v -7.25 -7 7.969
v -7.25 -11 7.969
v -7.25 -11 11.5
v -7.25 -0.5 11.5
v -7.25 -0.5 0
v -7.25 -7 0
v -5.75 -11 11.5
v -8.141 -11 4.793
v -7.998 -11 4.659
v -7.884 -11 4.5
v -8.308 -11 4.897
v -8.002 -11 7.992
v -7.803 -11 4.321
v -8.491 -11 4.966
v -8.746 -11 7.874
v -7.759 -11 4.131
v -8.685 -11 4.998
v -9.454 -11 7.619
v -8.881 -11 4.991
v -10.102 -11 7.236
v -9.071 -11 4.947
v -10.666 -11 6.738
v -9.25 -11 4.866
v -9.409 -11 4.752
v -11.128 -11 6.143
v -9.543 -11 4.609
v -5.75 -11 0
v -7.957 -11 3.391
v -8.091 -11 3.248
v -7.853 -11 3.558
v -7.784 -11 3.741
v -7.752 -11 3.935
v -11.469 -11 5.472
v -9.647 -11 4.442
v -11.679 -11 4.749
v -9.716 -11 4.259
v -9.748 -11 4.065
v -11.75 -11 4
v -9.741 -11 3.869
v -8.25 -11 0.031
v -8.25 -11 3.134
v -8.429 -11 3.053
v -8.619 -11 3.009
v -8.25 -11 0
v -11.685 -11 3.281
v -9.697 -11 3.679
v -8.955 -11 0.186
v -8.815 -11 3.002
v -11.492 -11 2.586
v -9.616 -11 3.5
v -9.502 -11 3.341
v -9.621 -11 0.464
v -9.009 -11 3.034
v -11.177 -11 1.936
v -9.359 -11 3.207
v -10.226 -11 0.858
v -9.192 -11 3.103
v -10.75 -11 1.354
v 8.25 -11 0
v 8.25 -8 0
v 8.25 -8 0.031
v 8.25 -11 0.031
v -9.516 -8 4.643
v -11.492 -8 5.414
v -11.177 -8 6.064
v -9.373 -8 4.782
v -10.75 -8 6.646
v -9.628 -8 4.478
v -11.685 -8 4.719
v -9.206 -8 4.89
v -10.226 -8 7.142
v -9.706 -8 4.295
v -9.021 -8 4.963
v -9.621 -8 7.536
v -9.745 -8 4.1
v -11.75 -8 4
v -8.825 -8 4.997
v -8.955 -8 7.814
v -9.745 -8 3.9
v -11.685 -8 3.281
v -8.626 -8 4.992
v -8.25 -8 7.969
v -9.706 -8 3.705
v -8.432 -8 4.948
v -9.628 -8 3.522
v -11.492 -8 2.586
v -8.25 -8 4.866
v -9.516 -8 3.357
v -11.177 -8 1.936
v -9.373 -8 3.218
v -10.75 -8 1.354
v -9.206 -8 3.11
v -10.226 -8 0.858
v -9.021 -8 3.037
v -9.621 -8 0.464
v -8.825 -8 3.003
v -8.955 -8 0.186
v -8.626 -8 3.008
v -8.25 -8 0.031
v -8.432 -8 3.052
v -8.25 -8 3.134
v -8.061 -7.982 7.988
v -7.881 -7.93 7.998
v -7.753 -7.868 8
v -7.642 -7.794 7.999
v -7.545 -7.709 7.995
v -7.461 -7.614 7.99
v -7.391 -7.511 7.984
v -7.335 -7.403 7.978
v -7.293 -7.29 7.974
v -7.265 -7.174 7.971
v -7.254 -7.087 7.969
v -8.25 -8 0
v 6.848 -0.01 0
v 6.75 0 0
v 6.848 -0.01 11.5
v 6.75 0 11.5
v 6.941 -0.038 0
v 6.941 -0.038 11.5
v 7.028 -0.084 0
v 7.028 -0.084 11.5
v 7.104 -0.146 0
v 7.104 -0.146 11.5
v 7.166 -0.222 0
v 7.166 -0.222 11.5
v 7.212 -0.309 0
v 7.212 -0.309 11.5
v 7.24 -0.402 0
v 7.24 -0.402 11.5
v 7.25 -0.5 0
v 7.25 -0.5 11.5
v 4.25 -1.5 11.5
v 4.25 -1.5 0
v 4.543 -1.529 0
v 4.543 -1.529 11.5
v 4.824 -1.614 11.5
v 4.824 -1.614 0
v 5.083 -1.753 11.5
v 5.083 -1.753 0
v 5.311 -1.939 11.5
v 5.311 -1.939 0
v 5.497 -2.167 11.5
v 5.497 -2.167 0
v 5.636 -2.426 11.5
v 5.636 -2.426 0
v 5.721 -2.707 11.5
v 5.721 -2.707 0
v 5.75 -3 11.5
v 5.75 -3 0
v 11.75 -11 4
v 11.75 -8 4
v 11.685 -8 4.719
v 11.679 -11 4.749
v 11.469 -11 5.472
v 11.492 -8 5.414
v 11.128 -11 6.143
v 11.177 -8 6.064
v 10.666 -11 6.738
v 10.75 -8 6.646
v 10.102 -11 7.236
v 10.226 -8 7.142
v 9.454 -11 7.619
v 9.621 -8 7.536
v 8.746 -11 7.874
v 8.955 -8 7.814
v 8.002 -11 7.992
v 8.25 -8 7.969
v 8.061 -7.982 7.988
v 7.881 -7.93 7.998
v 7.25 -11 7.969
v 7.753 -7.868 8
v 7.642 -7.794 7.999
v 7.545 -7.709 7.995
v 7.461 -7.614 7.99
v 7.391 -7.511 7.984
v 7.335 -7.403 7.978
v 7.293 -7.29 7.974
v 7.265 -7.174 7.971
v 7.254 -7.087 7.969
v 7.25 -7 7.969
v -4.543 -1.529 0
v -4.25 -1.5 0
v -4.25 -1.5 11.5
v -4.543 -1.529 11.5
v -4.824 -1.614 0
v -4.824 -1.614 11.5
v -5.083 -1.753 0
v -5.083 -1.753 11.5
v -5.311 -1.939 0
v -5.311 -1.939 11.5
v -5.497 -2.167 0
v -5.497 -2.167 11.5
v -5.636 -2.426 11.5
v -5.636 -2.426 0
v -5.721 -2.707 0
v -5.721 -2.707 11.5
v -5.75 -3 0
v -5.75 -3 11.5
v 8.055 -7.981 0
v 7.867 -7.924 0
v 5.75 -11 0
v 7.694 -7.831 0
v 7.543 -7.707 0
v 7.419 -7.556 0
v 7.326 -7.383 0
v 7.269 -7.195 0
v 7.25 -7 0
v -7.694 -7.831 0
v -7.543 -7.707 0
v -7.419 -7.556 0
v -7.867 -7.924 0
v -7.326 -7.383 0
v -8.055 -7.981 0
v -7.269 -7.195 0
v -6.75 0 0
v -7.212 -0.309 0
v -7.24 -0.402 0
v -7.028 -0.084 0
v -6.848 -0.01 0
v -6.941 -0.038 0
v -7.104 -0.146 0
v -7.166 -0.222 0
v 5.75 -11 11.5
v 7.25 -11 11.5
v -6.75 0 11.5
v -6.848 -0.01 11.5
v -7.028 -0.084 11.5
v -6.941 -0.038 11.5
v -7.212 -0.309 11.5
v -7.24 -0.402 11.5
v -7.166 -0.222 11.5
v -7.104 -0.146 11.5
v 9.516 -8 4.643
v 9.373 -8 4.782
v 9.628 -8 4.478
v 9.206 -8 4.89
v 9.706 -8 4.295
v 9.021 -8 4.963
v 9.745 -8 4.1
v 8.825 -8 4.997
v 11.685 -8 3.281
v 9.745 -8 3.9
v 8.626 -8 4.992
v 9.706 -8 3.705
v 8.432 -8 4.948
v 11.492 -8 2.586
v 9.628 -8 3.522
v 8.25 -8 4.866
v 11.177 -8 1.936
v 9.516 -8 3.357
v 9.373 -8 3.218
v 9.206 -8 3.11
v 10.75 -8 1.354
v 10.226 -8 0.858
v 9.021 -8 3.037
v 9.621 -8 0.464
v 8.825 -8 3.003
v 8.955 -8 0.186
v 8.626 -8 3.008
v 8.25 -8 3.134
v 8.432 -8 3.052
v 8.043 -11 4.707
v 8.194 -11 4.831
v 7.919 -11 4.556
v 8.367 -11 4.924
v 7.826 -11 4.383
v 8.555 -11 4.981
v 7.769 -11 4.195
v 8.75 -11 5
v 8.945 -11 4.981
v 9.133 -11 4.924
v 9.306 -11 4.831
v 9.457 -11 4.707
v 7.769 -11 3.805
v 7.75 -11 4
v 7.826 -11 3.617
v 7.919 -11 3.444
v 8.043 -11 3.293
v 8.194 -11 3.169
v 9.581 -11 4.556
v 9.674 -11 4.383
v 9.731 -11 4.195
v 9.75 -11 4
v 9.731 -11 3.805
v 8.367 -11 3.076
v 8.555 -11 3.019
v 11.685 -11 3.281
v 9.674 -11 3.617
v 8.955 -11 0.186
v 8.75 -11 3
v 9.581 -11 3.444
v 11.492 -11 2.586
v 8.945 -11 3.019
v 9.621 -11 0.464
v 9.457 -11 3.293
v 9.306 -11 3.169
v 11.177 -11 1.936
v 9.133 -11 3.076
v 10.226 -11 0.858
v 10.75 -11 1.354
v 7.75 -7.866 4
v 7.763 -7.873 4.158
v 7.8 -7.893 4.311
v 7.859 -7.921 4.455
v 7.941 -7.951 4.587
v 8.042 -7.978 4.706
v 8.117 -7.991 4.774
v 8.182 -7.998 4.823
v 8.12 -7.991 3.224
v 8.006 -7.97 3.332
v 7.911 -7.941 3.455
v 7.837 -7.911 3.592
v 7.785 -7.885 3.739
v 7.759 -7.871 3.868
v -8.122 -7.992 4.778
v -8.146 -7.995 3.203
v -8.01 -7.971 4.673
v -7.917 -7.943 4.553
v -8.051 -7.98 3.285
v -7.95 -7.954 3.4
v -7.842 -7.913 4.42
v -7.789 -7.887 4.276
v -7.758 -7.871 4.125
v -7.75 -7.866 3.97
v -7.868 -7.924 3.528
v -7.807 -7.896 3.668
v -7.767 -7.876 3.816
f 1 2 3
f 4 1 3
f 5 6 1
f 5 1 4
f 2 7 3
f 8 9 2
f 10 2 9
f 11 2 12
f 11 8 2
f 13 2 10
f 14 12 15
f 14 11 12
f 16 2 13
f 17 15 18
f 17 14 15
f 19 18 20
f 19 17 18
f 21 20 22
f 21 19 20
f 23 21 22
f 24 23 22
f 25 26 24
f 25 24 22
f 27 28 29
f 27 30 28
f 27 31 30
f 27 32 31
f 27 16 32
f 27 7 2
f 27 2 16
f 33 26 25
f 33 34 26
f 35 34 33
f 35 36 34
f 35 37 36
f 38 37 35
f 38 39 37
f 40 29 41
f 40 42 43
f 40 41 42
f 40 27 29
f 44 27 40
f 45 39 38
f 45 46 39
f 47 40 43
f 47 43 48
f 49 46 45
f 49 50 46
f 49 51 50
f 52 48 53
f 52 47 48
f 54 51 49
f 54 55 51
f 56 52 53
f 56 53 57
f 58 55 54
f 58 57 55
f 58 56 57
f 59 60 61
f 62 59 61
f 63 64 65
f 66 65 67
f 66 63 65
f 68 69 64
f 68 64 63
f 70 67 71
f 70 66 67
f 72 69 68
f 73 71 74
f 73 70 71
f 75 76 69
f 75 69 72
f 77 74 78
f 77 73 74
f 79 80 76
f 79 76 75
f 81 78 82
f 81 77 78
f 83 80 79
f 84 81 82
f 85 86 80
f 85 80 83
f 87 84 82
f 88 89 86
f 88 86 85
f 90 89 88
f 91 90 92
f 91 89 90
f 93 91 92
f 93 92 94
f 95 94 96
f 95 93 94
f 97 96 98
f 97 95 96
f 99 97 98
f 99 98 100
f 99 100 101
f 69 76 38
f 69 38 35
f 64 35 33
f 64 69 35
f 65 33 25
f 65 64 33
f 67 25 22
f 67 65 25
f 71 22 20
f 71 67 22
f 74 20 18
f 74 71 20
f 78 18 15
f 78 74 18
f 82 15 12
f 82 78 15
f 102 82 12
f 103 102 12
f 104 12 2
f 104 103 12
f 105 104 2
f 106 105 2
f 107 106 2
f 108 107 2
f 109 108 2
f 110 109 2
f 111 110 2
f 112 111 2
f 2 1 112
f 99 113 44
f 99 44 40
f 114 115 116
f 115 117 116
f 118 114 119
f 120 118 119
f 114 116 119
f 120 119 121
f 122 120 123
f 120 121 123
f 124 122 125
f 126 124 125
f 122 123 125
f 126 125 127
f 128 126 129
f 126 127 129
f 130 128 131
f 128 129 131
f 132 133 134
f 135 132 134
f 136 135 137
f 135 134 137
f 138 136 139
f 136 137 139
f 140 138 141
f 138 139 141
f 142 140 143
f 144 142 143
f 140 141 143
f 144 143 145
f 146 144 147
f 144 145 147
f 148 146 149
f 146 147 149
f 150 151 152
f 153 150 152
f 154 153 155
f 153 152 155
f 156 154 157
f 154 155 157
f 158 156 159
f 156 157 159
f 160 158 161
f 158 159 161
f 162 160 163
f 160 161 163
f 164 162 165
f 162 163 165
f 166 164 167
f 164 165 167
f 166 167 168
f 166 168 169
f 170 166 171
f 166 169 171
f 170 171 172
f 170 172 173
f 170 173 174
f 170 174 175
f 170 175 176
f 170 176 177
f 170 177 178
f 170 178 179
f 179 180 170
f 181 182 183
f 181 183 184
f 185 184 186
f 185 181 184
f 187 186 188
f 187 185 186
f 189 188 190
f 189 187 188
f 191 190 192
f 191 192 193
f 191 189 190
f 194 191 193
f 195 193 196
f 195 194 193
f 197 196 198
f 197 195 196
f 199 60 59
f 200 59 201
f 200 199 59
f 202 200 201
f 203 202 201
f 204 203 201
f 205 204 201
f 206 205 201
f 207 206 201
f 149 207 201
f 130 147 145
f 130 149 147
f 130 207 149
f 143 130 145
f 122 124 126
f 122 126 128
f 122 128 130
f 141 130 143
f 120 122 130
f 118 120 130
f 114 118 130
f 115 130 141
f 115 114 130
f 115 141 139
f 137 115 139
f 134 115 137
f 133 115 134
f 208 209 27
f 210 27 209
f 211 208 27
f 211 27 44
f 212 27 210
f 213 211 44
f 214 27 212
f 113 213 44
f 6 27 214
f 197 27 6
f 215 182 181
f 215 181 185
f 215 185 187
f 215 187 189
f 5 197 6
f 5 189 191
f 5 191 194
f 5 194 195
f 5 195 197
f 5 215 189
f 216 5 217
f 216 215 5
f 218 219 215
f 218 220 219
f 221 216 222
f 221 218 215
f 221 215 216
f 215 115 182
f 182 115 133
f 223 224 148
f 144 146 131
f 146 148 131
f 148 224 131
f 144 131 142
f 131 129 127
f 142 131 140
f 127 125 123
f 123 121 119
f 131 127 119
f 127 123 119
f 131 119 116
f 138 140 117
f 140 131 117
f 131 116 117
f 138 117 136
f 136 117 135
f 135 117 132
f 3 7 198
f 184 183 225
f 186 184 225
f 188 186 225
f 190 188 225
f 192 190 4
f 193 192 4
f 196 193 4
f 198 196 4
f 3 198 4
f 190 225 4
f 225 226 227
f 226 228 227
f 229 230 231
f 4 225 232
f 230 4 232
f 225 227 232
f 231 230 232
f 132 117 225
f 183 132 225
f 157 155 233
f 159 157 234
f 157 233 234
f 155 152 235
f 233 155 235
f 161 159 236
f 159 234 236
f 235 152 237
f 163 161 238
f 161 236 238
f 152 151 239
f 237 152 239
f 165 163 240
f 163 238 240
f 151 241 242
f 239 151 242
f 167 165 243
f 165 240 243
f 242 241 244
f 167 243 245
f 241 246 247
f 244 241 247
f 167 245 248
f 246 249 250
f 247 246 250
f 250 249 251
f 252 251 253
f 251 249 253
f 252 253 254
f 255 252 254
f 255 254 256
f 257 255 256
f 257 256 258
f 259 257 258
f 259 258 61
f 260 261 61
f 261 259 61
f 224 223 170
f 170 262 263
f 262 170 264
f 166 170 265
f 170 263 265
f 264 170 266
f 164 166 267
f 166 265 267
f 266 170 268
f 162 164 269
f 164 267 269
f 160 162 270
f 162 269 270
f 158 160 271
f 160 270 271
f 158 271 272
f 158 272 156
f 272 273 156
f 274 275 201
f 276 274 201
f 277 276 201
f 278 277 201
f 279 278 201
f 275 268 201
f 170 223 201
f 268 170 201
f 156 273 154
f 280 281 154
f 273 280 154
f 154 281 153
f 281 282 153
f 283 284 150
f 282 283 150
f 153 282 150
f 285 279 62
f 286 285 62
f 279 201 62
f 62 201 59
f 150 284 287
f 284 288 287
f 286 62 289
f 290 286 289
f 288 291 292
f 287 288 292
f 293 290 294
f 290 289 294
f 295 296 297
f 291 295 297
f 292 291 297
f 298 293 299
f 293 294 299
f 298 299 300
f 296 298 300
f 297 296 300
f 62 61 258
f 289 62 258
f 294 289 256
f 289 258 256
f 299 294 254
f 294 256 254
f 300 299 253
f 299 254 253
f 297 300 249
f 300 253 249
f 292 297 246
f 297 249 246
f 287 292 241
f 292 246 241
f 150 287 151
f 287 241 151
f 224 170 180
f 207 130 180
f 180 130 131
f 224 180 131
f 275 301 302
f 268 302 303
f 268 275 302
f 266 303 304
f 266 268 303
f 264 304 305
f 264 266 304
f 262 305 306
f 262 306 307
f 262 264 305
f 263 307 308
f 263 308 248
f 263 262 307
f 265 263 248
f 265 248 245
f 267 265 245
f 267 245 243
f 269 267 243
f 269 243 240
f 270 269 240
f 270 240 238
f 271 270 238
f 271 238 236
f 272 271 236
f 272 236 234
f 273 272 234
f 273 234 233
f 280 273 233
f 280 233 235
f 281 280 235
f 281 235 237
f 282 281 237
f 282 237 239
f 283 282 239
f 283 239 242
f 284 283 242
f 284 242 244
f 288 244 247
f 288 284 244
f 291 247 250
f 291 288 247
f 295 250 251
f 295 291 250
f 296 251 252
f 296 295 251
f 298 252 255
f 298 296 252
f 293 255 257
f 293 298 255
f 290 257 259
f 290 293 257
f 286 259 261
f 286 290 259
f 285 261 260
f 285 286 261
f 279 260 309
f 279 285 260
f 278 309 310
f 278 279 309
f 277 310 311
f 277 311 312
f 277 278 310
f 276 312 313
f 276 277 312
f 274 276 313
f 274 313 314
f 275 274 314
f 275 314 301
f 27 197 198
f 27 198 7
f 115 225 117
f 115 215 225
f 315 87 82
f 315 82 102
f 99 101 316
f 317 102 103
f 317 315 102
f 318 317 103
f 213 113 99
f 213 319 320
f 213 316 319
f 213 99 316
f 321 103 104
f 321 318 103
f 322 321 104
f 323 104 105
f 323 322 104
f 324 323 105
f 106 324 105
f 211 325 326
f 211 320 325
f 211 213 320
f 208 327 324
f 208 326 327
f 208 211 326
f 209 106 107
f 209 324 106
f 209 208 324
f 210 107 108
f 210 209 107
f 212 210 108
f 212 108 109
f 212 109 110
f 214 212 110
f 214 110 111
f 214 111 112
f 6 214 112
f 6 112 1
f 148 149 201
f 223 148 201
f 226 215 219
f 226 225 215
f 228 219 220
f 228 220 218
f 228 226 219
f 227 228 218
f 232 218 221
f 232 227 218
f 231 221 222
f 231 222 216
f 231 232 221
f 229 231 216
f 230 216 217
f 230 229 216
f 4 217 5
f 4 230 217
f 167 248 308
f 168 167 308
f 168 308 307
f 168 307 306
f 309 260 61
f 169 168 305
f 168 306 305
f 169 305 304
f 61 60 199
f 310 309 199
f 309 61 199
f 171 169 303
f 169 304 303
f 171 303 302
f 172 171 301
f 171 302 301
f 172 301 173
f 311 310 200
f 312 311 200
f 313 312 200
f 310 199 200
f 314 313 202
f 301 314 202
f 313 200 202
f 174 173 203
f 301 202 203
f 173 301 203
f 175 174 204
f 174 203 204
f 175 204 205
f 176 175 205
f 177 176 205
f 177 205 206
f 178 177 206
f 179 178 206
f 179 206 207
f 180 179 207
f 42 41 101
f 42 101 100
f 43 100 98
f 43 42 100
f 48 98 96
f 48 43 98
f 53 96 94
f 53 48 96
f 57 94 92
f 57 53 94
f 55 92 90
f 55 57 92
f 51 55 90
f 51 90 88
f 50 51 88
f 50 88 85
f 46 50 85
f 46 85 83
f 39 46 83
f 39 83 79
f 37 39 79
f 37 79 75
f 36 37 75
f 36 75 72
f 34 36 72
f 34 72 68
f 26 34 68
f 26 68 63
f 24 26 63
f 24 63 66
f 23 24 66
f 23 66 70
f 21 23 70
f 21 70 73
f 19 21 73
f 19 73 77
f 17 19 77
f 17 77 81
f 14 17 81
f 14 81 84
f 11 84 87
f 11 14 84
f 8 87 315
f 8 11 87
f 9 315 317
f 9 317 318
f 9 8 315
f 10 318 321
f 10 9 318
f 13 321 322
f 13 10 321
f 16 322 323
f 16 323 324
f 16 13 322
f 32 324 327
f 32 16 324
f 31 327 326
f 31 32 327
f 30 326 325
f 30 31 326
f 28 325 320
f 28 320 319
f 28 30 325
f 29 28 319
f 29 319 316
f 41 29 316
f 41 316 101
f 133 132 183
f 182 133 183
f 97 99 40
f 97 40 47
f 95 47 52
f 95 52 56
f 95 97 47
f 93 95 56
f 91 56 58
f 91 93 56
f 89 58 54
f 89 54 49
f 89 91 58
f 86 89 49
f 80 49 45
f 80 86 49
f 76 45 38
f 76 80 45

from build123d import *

# Parameters (mm, degrees)
SALIENTE_EXTRUIR1_DEPTH    = 11.5
REDONDEO1_R                = 0.5
CORTAR_EXTRUIR1_DEPTH      = 19.284214503
CORTAR_EXTRUIR2_DEPTH      = 19.284214567
CORTAR_EXTRUIR2_DEPTH_BACK = 19.284214567
CROQUIS4_R                 = 1


with BuildPart() as part:
    # Croquis1 → Saliente-Extruir1 (new body)
    with BuildSketch(Plane.XY):
        with BuildLine():
            Line((7.25, 0), (0, 0))
            Line((0, 0), (0, -1.5))
            Line((0, -1.5), (4.25, -1.5))
            ThreePointArc((4.25, -1.5), (5.310660172, -1.939339828), (5.75, -3))
            Line((5.75, -3), (5.75, -11))
            Line((5.75, -11), (11.75, -11))
            Line((11.75, -11), (11.75, -8))
            Line((11.75, -8), (8.25, -8))
            ThreePointArc((8.25, -8), (7.542893219, -7.707106781), (7.25, -7))
            Line((7.25, -7), (7.25, 0))
        make_face()
    saliente_extruir1 = extrude(amount=SALIENTE_EXTRUIR1_DEPTH)

    # Simetría1: Saliente-Extruir1 across plane
    add(saliente_extruir1.mirror(Plane(origin=(0, 0, 11.5), x_dir=(0, 0, 1), z_dir=(1, 0, 0))))

    # Redondeo1
    redondeo1_edges = [part.edges().sort_by_distance(p)[0] for p in [
        (7.25, 0, 5.75),
        (-7.25, 0, 5.75),
    ]]
    fillet(redondeo1_edges, radius=REDONDEO1_R)

    # Croquis3 → Cortar-Extruir1 (cut, symmetric)
    with BuildSketch(Plane(origin=(0, -8, 0), x_dir=(1, 0, 0), z_dir=(0, 1, 0))):
        with BuildLine():
            Line((8.25, -11.5), (8.25, -7.968626967))
            ThreePointArc((8.25, -7.968626967), (7.75, -8), (7.25, -7.968626967))
            Line((7.25, -7.968626967), (7.25, -11.5))
            Line((7.25, -11.5), (8.25, -11.5))
        make_face()
        with BuildLine():
            Line((11.75, -11.5), (11.75, -4))
            ThreePointArc((11.75, -4), (10.75, -6.645751311), (8.25, -7.968626967))
            Line((8.25, -7.968626967), (8.25, -11.5))
            Line((8.25, -11.5), (11.75, -11.5))
        make_face()
        with BuildLine():
            Line((11.75, 0), (8.25, 0))
            Line((8.25, 0), (8.25, -0.031373033))
            ThreePointArc((8.25, -0.031373033), (10.75, -1.354248689), (11.75, -4))
            Line((11.75, -4), (11.75, 0))
        make_face()
    cortar_extruir1 = extrude(amount=CORTAR_EXTRUIR1_DEPTH, both=True, mode=Mode.SUBTRACT)

    # Simetría2: Cortar-Extruir1 across plane
    add(cortar_extruir1.mirror(Plane(origin=(0, 0, 0), x_dir=(0, 0, 1), z_dir=(1, 0, 0))), mode=Mode.SUBTRACT)

    # Croquis4 → Cortar-Extruir2 (cut, two sides: drawn at the far end of the back side and taken through both)
    with BuildSketch(Plane(origin=(0, -8, 0), x_dir=(1, 0, 0), z_dir=(0, 1, 0)).offset(-CORTAR_EXTRUIR2_DEPTH_BACK)):
        with Locations(Location((8.75, -4, 0), (0, 0, 180))):
            Circle(CROQUIS4_R)
        with Locations(Location((-8.75, -4, 0), (0, 0, 60))):
            Circle(CROQUIS4_R)
    extrude(amount=CORTAR_EXTRUIR2_DEPTH + CORTAR_EXTRUIR2_DEPTH_BACK, mode=Mode.SUBTRACT)


solid = part.part
